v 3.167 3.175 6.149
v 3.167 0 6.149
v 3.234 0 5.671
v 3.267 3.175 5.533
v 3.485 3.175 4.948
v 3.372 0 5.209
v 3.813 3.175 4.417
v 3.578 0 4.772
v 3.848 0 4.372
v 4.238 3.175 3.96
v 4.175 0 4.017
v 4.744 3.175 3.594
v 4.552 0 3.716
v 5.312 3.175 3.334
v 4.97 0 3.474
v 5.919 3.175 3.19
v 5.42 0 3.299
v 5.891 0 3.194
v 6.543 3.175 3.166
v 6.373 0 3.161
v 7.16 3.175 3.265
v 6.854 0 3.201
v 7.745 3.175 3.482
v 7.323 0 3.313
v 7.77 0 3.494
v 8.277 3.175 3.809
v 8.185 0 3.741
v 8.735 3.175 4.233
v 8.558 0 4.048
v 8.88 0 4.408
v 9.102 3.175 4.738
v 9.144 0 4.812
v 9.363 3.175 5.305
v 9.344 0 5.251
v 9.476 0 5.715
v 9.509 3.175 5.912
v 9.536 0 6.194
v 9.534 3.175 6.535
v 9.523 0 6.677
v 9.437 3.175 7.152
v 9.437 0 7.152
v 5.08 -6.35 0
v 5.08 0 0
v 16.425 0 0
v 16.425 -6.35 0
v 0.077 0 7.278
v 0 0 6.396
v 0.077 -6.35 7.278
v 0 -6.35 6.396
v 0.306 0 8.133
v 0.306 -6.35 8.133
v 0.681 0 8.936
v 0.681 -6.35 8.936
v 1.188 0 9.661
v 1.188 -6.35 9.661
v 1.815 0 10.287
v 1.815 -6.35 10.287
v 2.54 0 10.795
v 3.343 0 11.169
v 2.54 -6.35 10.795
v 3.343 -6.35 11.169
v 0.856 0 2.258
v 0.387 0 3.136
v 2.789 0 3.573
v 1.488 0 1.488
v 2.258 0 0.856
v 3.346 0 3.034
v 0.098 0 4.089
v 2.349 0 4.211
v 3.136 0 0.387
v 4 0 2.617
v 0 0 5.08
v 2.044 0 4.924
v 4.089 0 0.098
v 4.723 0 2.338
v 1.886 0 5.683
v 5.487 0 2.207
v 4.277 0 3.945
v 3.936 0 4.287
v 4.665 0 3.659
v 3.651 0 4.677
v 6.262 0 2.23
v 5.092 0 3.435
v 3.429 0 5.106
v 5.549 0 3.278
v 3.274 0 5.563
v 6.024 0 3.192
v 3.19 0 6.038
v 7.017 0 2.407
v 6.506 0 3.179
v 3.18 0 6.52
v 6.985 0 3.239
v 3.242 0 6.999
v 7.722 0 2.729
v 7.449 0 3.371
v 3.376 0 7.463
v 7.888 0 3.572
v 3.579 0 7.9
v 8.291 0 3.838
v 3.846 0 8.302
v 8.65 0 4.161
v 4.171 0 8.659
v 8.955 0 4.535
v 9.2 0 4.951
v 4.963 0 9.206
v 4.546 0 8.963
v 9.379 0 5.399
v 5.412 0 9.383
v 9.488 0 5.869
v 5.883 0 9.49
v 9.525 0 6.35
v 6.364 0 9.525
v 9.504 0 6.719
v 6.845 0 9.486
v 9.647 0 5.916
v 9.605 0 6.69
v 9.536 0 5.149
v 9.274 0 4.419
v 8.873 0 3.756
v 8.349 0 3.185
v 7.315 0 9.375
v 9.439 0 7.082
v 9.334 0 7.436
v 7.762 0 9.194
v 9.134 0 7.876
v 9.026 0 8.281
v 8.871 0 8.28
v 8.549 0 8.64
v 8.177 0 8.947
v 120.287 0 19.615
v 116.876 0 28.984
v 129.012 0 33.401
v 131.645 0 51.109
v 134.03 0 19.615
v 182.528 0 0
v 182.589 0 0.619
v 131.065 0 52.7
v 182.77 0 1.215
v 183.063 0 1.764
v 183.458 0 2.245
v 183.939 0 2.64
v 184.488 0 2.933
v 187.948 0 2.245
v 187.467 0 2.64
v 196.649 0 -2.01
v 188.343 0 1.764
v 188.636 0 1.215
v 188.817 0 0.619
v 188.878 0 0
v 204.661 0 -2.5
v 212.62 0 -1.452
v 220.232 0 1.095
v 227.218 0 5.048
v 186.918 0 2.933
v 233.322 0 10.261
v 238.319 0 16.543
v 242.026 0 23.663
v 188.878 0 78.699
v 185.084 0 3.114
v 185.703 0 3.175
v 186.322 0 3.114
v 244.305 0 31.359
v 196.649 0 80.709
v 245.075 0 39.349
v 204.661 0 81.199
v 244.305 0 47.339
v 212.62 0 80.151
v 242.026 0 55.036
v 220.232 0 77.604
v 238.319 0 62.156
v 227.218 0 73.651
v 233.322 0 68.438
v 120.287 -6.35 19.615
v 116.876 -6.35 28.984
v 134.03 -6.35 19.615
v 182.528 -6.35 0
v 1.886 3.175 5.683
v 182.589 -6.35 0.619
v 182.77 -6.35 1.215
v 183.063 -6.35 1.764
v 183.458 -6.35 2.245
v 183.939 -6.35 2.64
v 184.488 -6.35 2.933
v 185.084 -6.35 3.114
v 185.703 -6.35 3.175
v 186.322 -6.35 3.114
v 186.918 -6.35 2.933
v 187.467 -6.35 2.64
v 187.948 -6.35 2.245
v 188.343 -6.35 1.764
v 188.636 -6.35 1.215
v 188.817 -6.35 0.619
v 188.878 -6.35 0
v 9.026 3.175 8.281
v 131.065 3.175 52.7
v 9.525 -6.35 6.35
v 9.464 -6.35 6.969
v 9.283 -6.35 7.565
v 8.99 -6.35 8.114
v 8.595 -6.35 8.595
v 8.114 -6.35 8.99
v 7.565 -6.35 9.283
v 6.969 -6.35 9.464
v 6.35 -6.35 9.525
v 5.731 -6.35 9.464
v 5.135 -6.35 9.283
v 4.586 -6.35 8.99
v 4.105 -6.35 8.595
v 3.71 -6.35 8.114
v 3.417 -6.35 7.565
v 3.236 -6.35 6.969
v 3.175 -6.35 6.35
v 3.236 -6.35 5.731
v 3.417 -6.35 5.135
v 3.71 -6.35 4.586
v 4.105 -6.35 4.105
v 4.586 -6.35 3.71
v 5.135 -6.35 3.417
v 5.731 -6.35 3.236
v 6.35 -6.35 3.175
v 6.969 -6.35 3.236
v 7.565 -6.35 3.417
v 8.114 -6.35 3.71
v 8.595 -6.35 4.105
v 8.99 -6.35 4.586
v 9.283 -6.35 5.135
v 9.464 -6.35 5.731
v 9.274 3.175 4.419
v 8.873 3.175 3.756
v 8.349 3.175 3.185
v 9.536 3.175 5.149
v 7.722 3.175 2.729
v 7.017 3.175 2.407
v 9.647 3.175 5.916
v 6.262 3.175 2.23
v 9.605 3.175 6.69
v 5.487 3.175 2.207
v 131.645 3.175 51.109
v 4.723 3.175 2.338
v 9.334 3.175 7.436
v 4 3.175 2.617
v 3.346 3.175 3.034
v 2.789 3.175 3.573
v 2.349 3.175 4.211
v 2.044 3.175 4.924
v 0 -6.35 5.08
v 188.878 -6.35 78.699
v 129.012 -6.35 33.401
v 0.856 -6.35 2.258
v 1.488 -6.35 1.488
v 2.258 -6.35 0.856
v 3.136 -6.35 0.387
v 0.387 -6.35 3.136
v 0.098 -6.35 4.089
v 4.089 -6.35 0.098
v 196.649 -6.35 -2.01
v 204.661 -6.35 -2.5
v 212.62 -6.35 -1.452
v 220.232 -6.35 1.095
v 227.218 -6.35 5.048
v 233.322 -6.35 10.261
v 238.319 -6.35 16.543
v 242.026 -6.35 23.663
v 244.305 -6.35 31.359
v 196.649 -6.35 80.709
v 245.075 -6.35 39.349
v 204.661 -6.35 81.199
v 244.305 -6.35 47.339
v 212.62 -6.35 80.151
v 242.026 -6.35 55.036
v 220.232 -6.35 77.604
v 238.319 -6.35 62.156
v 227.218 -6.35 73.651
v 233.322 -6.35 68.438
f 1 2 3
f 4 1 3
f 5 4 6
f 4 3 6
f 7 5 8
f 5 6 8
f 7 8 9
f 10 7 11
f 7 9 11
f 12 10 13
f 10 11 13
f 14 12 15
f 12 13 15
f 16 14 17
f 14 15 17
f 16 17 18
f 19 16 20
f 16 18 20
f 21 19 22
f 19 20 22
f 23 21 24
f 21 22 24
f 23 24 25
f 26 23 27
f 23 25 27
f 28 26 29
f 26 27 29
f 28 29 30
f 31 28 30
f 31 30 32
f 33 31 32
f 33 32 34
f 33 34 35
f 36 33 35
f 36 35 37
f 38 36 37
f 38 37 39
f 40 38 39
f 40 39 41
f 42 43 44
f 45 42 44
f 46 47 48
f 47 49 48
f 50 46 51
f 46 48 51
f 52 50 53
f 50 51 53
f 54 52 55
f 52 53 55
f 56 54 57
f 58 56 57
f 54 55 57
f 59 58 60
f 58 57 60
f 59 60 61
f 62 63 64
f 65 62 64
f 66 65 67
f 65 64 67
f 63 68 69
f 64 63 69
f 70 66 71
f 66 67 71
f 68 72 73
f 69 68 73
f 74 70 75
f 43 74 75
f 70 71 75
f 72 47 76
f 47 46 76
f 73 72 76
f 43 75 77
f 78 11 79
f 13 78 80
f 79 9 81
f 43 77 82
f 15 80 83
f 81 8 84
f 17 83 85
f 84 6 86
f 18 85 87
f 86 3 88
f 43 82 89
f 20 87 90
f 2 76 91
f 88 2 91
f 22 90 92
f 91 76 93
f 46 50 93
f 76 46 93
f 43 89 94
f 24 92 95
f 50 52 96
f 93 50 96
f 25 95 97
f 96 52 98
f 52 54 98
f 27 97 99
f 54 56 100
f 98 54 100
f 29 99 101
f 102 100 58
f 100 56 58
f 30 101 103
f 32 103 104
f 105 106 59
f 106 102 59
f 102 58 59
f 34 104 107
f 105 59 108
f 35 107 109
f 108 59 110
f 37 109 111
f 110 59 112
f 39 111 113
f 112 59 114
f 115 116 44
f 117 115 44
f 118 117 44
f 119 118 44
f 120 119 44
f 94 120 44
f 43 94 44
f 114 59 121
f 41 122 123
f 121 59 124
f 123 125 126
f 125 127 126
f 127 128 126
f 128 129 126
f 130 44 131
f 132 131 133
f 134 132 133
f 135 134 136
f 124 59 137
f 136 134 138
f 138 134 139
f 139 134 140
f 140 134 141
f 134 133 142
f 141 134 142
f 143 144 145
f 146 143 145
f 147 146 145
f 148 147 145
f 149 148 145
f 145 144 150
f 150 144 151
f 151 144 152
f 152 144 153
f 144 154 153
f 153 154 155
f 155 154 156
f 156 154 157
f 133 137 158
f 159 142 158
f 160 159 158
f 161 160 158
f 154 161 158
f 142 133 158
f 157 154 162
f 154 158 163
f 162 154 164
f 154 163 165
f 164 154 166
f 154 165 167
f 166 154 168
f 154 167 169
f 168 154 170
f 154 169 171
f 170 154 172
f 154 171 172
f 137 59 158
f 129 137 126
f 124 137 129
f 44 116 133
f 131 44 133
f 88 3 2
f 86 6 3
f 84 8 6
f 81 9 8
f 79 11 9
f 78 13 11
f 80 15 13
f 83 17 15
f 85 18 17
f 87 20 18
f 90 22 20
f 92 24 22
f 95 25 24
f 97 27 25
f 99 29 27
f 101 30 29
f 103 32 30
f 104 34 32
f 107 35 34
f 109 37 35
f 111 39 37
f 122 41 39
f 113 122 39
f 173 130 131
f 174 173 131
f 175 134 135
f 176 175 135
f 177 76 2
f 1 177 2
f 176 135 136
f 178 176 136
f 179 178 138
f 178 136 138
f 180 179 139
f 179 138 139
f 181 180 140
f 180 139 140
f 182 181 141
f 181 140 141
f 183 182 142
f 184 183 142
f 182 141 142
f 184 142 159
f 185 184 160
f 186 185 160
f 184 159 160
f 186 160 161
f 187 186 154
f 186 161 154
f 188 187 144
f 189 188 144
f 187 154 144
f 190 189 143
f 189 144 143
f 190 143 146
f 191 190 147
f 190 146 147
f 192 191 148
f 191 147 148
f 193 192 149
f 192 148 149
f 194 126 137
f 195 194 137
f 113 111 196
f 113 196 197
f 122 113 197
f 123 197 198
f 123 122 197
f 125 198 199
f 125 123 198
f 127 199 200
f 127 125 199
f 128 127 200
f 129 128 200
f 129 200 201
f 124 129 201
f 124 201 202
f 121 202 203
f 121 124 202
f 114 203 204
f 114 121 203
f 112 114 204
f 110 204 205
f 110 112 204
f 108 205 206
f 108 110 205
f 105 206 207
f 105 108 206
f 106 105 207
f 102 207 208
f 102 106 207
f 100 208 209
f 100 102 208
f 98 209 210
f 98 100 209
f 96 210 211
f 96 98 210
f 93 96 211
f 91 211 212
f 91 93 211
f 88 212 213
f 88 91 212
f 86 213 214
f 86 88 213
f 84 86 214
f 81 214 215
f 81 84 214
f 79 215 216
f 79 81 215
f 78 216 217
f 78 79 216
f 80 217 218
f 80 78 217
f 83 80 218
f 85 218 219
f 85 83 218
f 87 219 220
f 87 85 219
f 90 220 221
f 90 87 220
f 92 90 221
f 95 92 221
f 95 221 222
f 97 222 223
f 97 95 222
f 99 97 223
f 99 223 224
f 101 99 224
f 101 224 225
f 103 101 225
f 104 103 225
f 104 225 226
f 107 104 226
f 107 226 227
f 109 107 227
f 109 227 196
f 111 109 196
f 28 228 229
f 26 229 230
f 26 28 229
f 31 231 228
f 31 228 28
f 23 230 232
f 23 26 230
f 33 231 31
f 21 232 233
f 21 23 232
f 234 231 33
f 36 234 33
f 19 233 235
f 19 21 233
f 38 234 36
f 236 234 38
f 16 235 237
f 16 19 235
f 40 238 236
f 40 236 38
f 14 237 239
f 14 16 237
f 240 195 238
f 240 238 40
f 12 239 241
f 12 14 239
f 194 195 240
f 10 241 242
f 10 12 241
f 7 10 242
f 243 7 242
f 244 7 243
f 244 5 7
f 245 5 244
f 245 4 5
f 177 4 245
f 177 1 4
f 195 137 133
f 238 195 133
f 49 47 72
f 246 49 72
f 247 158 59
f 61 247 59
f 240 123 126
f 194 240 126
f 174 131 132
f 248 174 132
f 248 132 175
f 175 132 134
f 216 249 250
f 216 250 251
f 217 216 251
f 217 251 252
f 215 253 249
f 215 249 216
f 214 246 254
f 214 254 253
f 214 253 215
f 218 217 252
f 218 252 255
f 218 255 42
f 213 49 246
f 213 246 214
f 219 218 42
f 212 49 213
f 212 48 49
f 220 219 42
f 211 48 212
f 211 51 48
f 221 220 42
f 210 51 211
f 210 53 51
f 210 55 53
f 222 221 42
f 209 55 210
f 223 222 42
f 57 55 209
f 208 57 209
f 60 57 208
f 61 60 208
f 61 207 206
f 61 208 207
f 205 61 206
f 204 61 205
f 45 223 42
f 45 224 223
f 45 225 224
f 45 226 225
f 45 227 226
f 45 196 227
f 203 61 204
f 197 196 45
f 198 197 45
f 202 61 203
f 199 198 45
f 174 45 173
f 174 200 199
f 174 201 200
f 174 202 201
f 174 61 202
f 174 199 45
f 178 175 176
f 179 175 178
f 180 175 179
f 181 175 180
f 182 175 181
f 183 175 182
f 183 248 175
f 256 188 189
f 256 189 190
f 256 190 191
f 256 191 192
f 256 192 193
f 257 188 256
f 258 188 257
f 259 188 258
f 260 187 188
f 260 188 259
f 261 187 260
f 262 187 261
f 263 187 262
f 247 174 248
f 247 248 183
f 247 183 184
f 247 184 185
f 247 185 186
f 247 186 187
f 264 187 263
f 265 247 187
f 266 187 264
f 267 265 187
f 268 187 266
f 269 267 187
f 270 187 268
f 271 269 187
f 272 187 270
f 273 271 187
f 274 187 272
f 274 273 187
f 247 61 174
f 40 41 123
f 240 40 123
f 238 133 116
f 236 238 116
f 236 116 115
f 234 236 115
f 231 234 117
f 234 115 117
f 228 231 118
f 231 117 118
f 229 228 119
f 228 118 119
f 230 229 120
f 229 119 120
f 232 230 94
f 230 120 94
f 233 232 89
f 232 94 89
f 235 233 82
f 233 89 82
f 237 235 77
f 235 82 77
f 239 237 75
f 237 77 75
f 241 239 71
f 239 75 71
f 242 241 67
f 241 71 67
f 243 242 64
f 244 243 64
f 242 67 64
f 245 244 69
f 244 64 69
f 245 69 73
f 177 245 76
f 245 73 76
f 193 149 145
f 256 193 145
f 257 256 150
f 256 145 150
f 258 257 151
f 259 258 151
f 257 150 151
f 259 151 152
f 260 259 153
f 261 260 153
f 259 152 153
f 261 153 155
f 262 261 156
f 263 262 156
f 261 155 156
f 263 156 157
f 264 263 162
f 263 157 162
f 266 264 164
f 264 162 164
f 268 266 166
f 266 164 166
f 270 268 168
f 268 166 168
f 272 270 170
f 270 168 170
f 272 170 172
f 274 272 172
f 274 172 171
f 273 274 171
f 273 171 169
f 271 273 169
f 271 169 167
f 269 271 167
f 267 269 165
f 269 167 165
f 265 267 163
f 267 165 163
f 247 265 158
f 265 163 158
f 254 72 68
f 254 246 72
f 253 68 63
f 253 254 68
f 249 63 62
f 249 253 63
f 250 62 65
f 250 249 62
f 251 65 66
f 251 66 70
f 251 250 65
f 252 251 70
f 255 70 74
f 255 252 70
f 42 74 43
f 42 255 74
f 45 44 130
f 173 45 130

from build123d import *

# Parameters (mm, degrees)
F0_R     = 3.175
F1_DEPTH = 6.35
F2_R     = 5.08
F4_DEPTH = 3.175
F6_DEPTH = 3.175


with BuildPart() as f1:
    # F0 (on Front) → F1 (new body)
    with BuildSketch(Plane.XZ):
        with BuildLine():
            Line((0, 9.952783), (0, 0))
            Line((0, 0), (16.424974, 0))
            Line((16.424974, 0), (120.286547, 19.615395))
            Line((120.286547, 19.615395), (116.876498, 28.984427))
            Line((116.876498, 28.984427), (129.012049, 33.401406))
            Line((129.012049, 33.401406), (134.029747, 19.615395))
            Line((134.029747, 19.615395), (182.527998, 0))
            ThreePointArc((182.527998, 0), (185.702998, 3.175), (188.877998, 0))
            ThreePointArc((188.877998, 0), (245.074731, 39.349376), (188.877998, 78.698752))
            Line((188.877998, 78.698752), (0, 9.952783))
        make_face()
        with Locations((6.35, 6.35)):
            Circle(F0_R, mode=Mode.SUBTRACT)
    extrude(amount=F1_DEPTH)

    # F2
    f2_edges = [f1.edges().sort_by_distance(p)[0] for p in [
        (0, -3.175, 9.952783),
        (0, -3.175, 0),
    ]]
    fillet(f2_edges, radius=F2_R)

    # F3 (on face) → F4 (join)
    with BuildSketch(Plane(origin=(0, 0, 0), x_dir=(-1, 0, 0), z_dir=(0, 1, 0))):
        Polygon((-9.025761, 8.281487), (-131.065451, 52.700301), (-131.644688, 51.108862), (-9.604997, 6.690047), (-9.333524, 7.435914), align=None)
    extrude(amount=F4_DEPTH)

    # F5 (on face) → F6 (join)
    with BuildSketch(Plane(origin=(0, 0, 0), x_dir=(-1, 0, 0), z_dir=(0, 1, 0))):
        with BuildLine():
            Line((-9.436891, 7.151916), (-9.604997, 6.690047))
            ThreePointArc((-9.604997, 6.690047), (-6.261769, 2.230211), (-1.886095, 5.682861))
            Line((-1.886095, 5.682861), (-3.166984, 6.149066))
            ThreePointArc((-3.166984, 6.149066), (-6.853723, 3.200678), (-9.436891, 7.151916))
        make_face()
    extrude(amount=F6_DEPTH)


solid = f1.part
